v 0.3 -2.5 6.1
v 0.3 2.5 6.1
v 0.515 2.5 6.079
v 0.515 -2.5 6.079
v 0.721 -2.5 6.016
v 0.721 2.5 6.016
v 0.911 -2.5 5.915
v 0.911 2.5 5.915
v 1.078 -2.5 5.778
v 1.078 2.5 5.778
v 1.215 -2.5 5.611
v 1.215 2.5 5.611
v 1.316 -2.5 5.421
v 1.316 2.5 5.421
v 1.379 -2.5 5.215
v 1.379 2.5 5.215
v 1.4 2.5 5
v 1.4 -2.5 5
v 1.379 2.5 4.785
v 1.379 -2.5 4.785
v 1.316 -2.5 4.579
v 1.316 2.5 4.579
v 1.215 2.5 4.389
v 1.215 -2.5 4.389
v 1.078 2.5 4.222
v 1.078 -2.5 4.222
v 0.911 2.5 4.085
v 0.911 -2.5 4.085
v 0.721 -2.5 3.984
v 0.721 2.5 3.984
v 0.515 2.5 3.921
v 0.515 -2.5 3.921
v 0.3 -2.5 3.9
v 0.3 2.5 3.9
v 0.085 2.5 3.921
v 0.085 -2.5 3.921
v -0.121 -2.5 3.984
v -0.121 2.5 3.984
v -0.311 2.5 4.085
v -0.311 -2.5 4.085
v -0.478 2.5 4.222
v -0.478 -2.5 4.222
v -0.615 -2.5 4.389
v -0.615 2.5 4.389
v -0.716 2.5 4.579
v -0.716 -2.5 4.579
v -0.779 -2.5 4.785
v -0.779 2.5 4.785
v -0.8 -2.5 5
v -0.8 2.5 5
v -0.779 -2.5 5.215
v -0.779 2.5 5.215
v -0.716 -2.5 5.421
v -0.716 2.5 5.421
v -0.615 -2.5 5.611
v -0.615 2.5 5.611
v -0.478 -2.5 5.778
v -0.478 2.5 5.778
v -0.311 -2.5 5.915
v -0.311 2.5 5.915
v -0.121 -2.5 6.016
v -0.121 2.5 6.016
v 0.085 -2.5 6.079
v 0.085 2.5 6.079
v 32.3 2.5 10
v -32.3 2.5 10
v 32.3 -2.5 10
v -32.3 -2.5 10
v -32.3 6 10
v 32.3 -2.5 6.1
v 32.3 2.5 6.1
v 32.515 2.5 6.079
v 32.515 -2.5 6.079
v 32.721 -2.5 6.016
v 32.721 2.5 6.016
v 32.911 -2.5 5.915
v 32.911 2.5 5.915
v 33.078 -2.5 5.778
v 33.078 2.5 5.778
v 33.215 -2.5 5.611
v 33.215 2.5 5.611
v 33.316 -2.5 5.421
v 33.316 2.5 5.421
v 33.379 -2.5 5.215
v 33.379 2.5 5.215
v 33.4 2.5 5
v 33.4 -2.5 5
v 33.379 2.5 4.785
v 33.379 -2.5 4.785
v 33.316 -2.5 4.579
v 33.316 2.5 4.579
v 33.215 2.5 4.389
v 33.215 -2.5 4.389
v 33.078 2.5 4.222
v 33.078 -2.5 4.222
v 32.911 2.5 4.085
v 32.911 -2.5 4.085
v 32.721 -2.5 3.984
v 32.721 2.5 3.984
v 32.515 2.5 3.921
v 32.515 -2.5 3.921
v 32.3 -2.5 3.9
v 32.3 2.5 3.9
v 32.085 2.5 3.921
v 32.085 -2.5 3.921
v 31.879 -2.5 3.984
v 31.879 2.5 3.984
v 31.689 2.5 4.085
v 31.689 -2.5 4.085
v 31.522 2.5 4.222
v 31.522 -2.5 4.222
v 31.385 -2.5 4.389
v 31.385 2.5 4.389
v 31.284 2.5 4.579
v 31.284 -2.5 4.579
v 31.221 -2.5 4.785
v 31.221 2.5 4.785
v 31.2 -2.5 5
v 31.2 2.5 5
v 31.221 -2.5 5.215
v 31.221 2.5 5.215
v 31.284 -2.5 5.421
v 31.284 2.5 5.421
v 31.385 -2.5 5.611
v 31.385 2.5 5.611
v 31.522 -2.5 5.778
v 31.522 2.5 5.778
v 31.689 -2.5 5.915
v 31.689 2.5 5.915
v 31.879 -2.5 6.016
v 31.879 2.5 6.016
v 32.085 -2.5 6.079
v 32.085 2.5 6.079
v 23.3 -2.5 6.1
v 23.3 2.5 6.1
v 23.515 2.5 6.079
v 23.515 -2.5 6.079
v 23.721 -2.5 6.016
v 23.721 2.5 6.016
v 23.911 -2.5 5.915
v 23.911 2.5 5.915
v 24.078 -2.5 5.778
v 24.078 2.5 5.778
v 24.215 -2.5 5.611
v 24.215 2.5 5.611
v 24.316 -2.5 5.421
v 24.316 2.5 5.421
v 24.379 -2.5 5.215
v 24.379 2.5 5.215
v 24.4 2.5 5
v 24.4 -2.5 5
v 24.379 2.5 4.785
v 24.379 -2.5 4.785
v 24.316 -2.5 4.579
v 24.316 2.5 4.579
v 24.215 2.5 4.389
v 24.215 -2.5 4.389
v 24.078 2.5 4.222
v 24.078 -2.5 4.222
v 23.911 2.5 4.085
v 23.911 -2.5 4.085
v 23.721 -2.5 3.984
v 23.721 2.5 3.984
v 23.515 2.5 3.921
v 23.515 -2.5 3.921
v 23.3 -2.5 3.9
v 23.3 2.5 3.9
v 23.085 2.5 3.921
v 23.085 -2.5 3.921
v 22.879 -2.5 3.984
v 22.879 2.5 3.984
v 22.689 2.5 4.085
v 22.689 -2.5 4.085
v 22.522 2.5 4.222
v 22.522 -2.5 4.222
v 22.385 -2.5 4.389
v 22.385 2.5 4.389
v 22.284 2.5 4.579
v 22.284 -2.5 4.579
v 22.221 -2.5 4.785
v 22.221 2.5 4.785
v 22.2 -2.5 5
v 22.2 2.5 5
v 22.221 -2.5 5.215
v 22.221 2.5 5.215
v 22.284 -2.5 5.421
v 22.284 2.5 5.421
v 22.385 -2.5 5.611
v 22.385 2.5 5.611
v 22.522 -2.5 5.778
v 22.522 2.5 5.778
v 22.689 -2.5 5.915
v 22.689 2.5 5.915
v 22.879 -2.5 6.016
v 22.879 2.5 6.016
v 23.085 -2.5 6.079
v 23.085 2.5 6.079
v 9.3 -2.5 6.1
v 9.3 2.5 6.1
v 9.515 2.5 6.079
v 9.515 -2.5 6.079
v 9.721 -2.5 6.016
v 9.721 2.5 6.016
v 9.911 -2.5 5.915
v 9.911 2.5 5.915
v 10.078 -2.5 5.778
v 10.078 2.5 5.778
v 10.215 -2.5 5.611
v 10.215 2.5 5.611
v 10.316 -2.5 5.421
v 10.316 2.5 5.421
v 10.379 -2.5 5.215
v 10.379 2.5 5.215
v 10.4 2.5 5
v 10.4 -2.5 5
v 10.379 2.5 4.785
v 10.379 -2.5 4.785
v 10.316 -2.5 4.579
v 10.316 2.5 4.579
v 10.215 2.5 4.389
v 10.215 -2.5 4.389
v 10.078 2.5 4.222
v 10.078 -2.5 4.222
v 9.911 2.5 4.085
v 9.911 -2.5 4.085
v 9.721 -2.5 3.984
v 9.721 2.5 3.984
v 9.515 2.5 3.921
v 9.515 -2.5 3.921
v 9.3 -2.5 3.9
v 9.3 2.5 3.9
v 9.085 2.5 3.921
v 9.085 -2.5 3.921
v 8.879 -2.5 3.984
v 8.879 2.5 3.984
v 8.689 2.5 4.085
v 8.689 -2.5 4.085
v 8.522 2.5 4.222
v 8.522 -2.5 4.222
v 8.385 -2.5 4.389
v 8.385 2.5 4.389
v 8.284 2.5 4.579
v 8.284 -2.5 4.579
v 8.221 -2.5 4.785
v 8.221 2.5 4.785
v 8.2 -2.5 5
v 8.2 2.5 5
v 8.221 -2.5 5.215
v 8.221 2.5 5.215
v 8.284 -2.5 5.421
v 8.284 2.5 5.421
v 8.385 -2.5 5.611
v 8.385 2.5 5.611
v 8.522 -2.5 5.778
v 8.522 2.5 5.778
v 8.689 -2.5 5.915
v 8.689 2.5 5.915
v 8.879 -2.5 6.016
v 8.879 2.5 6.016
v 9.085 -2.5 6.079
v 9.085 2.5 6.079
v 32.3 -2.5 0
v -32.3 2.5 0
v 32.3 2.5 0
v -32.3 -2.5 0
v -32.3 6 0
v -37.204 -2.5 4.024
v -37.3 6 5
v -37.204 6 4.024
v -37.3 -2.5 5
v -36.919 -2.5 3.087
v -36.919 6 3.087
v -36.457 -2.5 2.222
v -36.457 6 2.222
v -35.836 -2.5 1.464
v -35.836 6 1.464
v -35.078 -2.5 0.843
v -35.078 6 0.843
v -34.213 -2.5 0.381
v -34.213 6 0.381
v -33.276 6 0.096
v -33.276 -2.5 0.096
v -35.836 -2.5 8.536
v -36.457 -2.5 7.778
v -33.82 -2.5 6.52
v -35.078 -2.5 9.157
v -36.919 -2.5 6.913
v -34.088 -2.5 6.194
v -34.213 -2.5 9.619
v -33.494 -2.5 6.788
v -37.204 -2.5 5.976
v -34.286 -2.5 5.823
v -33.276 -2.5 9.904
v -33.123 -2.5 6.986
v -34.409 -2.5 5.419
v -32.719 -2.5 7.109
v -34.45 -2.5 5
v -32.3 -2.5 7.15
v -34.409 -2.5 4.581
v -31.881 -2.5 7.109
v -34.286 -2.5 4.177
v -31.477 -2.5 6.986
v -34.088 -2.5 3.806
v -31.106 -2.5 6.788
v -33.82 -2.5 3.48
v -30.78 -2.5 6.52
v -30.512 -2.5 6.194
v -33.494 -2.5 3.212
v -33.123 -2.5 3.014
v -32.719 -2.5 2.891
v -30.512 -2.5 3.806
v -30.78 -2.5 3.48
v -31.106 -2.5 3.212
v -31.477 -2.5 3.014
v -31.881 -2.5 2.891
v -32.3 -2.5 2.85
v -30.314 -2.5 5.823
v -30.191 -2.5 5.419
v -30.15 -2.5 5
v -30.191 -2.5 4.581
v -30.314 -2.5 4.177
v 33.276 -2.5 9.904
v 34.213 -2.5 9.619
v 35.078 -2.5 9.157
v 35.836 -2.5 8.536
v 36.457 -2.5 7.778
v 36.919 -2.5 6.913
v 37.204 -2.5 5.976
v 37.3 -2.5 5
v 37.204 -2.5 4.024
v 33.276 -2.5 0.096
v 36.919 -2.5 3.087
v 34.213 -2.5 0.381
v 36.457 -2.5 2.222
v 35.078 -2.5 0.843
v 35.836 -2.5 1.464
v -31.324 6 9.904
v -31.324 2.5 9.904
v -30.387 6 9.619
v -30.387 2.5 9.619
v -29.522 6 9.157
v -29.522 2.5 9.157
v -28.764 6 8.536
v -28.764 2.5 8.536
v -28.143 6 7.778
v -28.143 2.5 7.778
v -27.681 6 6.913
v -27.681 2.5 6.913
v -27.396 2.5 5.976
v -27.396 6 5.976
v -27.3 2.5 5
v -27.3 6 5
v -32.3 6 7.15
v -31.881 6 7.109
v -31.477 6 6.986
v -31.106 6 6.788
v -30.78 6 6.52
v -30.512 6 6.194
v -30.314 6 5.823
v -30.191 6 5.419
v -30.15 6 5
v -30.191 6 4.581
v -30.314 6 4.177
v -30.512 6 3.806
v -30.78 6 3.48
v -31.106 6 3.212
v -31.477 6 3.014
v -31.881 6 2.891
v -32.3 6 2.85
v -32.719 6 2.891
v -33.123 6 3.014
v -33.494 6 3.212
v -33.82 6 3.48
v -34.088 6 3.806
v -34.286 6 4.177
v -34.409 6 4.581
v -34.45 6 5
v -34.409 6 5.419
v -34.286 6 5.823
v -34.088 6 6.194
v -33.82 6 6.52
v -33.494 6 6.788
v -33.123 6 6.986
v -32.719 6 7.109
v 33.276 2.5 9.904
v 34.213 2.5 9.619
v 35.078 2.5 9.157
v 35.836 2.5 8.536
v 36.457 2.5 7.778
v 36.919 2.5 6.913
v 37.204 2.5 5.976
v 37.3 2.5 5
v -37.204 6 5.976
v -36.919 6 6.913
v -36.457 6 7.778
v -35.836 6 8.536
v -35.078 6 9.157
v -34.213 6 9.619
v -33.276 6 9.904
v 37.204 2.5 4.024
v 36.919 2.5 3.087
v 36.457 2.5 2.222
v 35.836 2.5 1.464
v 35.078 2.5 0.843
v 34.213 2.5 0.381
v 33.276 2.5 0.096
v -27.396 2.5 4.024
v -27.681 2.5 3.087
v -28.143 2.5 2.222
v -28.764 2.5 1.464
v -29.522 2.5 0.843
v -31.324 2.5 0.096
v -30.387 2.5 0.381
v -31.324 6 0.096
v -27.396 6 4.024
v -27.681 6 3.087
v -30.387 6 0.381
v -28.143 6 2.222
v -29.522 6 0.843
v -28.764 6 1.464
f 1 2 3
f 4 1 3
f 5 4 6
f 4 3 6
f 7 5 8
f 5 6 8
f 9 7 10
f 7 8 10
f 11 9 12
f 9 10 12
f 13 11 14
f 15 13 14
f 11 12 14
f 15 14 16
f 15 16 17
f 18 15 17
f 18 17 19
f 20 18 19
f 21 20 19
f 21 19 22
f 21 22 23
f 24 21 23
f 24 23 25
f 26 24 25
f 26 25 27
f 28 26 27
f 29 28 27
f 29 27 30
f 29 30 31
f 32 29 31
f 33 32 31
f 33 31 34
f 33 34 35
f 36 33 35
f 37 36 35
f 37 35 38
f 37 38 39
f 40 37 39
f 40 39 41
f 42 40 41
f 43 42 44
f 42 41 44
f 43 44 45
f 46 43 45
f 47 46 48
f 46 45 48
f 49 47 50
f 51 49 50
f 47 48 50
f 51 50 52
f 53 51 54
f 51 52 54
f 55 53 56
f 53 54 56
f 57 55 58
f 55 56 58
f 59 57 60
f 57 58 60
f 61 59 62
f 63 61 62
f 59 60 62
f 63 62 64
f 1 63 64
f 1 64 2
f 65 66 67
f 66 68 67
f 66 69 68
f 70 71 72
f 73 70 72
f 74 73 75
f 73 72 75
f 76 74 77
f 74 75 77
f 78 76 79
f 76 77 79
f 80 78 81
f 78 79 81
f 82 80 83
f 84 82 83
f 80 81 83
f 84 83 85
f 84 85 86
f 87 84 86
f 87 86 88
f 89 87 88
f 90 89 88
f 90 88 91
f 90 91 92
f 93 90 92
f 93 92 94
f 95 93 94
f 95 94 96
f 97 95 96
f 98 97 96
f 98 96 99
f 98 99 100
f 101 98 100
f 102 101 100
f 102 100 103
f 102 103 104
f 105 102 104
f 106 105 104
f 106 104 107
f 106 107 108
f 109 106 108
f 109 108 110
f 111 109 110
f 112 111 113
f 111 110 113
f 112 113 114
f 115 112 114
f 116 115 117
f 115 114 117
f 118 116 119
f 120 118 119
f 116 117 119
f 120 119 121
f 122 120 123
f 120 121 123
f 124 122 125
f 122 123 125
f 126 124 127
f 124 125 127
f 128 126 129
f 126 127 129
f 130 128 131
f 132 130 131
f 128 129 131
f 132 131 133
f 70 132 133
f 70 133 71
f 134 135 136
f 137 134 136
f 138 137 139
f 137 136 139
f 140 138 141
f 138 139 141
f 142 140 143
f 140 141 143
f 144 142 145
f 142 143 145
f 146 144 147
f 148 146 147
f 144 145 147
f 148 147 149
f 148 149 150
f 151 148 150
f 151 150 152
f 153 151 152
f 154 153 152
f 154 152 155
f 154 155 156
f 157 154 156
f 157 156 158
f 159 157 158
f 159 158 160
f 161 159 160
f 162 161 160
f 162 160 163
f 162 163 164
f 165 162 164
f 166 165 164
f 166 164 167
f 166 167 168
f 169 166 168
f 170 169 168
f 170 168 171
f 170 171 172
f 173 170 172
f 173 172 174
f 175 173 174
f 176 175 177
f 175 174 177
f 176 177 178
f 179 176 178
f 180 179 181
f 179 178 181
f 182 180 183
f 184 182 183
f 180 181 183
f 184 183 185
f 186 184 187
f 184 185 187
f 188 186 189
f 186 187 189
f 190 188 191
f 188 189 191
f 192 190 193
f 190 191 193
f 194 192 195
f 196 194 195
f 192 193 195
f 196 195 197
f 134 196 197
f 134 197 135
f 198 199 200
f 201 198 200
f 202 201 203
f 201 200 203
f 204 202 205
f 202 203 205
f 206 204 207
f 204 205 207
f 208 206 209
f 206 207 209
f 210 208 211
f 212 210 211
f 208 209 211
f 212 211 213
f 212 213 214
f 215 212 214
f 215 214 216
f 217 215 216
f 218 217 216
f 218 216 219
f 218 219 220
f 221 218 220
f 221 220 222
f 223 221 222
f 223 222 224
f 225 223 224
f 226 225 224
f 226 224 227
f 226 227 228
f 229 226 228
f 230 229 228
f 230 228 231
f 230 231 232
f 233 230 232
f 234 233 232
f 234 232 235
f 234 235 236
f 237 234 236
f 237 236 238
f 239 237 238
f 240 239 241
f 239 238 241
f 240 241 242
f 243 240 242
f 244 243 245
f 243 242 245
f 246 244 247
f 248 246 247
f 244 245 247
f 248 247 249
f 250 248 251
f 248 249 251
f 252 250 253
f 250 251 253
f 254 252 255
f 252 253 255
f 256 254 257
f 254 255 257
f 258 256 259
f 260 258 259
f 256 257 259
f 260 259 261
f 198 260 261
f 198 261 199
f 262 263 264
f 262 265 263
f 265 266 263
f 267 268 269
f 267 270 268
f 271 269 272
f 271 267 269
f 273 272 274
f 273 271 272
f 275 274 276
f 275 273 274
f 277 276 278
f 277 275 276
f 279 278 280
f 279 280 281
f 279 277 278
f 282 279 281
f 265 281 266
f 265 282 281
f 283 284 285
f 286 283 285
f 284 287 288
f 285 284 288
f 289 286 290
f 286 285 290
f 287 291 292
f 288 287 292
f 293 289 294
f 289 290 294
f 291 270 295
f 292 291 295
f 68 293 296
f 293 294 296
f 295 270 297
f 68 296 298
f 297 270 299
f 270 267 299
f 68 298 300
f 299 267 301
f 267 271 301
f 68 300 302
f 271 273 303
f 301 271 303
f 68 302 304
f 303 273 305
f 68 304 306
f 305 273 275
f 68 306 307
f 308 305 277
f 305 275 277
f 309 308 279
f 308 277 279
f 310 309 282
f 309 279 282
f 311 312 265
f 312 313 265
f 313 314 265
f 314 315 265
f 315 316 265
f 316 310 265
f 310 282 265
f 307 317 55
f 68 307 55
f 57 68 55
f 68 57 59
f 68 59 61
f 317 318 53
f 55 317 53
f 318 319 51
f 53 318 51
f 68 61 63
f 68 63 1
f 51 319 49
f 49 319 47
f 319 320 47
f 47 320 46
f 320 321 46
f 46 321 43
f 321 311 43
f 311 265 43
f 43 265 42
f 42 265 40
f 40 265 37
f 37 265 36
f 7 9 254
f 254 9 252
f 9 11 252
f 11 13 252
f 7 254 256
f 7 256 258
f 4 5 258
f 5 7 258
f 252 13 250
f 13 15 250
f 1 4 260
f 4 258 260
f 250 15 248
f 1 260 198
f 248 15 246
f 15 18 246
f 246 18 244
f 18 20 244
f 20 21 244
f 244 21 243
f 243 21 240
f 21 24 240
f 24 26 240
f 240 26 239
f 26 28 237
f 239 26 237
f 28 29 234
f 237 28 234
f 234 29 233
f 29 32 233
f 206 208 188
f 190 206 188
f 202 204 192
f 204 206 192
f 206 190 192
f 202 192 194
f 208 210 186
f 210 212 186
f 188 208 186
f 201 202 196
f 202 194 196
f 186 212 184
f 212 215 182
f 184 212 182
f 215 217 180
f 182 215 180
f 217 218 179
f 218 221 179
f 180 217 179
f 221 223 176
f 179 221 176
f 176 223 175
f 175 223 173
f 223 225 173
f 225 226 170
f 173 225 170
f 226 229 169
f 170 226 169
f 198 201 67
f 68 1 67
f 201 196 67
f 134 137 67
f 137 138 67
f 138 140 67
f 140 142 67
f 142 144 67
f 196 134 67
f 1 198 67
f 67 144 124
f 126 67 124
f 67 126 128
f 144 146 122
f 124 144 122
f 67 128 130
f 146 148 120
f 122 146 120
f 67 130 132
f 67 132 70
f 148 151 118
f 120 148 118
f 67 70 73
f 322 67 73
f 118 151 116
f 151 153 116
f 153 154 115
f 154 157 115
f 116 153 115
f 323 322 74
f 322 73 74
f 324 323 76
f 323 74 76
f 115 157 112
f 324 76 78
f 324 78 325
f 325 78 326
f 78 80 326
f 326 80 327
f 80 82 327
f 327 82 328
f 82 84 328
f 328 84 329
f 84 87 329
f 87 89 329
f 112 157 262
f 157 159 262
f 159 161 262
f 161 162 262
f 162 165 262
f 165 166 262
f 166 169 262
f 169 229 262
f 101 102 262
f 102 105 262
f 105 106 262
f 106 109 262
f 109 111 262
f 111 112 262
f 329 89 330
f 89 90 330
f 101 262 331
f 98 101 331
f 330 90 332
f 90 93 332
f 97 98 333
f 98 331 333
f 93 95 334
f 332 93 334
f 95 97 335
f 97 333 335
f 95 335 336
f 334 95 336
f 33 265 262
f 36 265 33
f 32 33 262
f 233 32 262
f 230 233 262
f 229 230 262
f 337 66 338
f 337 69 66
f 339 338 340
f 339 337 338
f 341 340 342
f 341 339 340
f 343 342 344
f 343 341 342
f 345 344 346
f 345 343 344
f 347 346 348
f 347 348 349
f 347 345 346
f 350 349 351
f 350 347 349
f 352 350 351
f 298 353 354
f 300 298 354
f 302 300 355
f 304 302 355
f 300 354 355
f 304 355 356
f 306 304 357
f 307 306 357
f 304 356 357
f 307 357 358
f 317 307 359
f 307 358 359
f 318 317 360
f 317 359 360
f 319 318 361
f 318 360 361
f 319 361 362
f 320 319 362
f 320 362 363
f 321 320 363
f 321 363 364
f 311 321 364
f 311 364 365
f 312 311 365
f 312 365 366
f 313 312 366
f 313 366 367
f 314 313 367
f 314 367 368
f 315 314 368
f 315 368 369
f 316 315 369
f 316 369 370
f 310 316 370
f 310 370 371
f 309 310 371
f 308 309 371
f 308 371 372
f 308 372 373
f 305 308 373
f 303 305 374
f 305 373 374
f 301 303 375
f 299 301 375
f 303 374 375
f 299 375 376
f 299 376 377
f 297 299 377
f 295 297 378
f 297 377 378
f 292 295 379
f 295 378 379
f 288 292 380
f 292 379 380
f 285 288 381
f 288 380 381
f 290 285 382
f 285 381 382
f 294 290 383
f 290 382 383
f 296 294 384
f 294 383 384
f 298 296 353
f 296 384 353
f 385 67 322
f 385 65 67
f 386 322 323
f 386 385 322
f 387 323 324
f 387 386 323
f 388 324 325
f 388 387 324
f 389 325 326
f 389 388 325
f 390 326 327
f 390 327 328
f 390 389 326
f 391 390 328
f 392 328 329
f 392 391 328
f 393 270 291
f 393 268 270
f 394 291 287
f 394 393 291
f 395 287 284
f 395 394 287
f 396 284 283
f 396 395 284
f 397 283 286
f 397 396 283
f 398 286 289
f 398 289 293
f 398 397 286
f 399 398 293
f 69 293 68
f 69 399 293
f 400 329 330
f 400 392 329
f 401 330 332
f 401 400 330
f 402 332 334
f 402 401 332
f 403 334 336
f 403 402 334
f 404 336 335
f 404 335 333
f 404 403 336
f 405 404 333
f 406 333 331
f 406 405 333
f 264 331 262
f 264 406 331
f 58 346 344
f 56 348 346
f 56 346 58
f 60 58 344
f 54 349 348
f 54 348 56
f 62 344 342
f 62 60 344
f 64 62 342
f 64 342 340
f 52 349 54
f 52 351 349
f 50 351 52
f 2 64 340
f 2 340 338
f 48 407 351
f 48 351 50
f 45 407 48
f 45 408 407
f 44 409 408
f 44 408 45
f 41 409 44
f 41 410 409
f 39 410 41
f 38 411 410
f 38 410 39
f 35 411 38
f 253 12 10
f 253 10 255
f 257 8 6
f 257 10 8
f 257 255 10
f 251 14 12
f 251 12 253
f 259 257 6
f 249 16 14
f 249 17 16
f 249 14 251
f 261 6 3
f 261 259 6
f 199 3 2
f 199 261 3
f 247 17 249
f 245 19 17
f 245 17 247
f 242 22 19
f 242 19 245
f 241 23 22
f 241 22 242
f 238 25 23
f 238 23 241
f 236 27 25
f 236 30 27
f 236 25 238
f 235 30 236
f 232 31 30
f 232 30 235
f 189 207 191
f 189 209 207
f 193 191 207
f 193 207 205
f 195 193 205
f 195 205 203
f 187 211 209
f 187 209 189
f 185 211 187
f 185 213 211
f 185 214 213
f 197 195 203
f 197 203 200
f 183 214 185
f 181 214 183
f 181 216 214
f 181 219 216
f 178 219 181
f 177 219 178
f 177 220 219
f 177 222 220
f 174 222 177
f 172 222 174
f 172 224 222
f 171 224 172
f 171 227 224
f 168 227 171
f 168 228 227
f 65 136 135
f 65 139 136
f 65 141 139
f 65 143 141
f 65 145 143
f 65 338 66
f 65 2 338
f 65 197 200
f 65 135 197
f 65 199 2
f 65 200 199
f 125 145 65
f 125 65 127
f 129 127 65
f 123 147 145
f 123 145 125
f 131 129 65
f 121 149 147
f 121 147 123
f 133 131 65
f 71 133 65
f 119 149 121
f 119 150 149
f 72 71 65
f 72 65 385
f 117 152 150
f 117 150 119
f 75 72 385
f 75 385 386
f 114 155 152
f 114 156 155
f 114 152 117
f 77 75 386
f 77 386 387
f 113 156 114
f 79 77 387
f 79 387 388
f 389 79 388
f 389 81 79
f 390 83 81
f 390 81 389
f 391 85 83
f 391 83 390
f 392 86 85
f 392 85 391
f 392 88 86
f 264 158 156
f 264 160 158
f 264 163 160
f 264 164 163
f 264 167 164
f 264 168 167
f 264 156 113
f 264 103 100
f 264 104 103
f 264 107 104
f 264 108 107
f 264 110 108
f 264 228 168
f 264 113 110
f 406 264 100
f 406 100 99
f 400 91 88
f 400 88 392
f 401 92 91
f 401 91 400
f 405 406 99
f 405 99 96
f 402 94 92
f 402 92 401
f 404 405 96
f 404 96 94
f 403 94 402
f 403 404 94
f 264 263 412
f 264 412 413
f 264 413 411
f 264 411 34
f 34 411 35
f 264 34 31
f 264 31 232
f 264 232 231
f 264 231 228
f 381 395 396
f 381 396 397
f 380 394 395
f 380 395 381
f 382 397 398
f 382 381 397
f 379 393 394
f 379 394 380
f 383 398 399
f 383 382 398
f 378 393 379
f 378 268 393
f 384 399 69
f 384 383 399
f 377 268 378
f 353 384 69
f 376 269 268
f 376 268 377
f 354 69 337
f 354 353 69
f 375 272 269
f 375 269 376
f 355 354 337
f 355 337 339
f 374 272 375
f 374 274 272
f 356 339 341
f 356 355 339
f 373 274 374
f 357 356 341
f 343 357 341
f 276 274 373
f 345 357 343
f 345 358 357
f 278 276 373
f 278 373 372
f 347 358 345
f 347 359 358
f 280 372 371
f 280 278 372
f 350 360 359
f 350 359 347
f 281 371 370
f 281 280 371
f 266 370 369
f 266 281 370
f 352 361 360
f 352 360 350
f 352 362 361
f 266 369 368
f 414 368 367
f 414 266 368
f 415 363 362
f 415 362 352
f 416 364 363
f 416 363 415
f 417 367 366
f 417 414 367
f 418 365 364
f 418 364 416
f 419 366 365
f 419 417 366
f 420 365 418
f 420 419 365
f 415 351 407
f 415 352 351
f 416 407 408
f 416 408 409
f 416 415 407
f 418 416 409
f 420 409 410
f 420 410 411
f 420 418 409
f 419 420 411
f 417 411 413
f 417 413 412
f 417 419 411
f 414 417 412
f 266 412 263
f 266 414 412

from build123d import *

# Parameters (mm, degrees)
SKETCH_1_W          = 74.6
SKETCH_1_H          = 5
EXTRUDE_1_DEPTH     = 10
SKETCH_4_W          = 10
SKETCH_4_H          = 10
EXTRUDE_2_DEPTH     = 3.5
FILLET_1_R          = 5
SKETCH_2_R          = 2.15
SKETCH_2_R_2        = 1.1
CUT_EXTRUDE_1_DEPTH = 40.541623639


with BuildPart() as part:
    # 스케치1 → 보스-돌출1 (new body)
    with BuildSketch(Plane.XY):
        Rectangle(SKETCH_1_W, SKETCH_1_H)
    extrude(amount=EXTRUDE_1_DEPTH)

    # 스케치4 → 보스-돌출2 (add)
    with BuildSketch(Plane(origin=(0, 2.5, 0), x_dir=(1, 0, 0), z_dir=(0, 1, 0))):
        with Locations((-32.3, -5)):
            Rectangle(SKETCH_4_W, SKETCH_4_H)
    extrude(amount=EXTRUDE_2_DEPTH)

    # 필렛1
    fillet_1_edges = [part.edges().sort_by_distance(p)[0] for p in [
        (37.3, 0, 0),
        (37.3, 0, 10),
        (-37.3, 1.75, 0),
        (-37.3, 1.75, 10),
        (-27.3, 4.25, 10),
        (-27.3, 4.25, 0),
    ]]
    fillet(fillet_1_edges, radius=FILLET_1_R - 0.0001)  # a hair under: the kernel refuses the full size

    # 스케치2 → 컷-돌출1 (cut, through all)
    with BuildSketch(Plane(origin=(0, 6, 0), x_dir=(1, 0, 0), z_dir=(0, 1, 0))):
        with Locations(Location((-32.3, -5, 0), (0, 0, 270))):
            Circle(SKETCH_2_R)
        with Locations(Location((32.3, -5, 0), (0, 0, 270))):
            Circle(SKETCH_2_R_2)
        with Locations(Location((23.3, -5, 0), (0, 0, 270))):
            Circle(SKETCH_2_R_2)
        with Locations(Location((9.3, -5, 0), (0, 0, 270))):
            Circle(SKETCH_2_R_2)
        with Locations(Location((0.3, -5, 0), (0, 0, 270))):
            Circle(SKETCH_2_R_2)
    extrude(amount=-CUT_EXTRUDE_1_DEPTH, mode=Mode.SUBTRACT)


solid = part.part
